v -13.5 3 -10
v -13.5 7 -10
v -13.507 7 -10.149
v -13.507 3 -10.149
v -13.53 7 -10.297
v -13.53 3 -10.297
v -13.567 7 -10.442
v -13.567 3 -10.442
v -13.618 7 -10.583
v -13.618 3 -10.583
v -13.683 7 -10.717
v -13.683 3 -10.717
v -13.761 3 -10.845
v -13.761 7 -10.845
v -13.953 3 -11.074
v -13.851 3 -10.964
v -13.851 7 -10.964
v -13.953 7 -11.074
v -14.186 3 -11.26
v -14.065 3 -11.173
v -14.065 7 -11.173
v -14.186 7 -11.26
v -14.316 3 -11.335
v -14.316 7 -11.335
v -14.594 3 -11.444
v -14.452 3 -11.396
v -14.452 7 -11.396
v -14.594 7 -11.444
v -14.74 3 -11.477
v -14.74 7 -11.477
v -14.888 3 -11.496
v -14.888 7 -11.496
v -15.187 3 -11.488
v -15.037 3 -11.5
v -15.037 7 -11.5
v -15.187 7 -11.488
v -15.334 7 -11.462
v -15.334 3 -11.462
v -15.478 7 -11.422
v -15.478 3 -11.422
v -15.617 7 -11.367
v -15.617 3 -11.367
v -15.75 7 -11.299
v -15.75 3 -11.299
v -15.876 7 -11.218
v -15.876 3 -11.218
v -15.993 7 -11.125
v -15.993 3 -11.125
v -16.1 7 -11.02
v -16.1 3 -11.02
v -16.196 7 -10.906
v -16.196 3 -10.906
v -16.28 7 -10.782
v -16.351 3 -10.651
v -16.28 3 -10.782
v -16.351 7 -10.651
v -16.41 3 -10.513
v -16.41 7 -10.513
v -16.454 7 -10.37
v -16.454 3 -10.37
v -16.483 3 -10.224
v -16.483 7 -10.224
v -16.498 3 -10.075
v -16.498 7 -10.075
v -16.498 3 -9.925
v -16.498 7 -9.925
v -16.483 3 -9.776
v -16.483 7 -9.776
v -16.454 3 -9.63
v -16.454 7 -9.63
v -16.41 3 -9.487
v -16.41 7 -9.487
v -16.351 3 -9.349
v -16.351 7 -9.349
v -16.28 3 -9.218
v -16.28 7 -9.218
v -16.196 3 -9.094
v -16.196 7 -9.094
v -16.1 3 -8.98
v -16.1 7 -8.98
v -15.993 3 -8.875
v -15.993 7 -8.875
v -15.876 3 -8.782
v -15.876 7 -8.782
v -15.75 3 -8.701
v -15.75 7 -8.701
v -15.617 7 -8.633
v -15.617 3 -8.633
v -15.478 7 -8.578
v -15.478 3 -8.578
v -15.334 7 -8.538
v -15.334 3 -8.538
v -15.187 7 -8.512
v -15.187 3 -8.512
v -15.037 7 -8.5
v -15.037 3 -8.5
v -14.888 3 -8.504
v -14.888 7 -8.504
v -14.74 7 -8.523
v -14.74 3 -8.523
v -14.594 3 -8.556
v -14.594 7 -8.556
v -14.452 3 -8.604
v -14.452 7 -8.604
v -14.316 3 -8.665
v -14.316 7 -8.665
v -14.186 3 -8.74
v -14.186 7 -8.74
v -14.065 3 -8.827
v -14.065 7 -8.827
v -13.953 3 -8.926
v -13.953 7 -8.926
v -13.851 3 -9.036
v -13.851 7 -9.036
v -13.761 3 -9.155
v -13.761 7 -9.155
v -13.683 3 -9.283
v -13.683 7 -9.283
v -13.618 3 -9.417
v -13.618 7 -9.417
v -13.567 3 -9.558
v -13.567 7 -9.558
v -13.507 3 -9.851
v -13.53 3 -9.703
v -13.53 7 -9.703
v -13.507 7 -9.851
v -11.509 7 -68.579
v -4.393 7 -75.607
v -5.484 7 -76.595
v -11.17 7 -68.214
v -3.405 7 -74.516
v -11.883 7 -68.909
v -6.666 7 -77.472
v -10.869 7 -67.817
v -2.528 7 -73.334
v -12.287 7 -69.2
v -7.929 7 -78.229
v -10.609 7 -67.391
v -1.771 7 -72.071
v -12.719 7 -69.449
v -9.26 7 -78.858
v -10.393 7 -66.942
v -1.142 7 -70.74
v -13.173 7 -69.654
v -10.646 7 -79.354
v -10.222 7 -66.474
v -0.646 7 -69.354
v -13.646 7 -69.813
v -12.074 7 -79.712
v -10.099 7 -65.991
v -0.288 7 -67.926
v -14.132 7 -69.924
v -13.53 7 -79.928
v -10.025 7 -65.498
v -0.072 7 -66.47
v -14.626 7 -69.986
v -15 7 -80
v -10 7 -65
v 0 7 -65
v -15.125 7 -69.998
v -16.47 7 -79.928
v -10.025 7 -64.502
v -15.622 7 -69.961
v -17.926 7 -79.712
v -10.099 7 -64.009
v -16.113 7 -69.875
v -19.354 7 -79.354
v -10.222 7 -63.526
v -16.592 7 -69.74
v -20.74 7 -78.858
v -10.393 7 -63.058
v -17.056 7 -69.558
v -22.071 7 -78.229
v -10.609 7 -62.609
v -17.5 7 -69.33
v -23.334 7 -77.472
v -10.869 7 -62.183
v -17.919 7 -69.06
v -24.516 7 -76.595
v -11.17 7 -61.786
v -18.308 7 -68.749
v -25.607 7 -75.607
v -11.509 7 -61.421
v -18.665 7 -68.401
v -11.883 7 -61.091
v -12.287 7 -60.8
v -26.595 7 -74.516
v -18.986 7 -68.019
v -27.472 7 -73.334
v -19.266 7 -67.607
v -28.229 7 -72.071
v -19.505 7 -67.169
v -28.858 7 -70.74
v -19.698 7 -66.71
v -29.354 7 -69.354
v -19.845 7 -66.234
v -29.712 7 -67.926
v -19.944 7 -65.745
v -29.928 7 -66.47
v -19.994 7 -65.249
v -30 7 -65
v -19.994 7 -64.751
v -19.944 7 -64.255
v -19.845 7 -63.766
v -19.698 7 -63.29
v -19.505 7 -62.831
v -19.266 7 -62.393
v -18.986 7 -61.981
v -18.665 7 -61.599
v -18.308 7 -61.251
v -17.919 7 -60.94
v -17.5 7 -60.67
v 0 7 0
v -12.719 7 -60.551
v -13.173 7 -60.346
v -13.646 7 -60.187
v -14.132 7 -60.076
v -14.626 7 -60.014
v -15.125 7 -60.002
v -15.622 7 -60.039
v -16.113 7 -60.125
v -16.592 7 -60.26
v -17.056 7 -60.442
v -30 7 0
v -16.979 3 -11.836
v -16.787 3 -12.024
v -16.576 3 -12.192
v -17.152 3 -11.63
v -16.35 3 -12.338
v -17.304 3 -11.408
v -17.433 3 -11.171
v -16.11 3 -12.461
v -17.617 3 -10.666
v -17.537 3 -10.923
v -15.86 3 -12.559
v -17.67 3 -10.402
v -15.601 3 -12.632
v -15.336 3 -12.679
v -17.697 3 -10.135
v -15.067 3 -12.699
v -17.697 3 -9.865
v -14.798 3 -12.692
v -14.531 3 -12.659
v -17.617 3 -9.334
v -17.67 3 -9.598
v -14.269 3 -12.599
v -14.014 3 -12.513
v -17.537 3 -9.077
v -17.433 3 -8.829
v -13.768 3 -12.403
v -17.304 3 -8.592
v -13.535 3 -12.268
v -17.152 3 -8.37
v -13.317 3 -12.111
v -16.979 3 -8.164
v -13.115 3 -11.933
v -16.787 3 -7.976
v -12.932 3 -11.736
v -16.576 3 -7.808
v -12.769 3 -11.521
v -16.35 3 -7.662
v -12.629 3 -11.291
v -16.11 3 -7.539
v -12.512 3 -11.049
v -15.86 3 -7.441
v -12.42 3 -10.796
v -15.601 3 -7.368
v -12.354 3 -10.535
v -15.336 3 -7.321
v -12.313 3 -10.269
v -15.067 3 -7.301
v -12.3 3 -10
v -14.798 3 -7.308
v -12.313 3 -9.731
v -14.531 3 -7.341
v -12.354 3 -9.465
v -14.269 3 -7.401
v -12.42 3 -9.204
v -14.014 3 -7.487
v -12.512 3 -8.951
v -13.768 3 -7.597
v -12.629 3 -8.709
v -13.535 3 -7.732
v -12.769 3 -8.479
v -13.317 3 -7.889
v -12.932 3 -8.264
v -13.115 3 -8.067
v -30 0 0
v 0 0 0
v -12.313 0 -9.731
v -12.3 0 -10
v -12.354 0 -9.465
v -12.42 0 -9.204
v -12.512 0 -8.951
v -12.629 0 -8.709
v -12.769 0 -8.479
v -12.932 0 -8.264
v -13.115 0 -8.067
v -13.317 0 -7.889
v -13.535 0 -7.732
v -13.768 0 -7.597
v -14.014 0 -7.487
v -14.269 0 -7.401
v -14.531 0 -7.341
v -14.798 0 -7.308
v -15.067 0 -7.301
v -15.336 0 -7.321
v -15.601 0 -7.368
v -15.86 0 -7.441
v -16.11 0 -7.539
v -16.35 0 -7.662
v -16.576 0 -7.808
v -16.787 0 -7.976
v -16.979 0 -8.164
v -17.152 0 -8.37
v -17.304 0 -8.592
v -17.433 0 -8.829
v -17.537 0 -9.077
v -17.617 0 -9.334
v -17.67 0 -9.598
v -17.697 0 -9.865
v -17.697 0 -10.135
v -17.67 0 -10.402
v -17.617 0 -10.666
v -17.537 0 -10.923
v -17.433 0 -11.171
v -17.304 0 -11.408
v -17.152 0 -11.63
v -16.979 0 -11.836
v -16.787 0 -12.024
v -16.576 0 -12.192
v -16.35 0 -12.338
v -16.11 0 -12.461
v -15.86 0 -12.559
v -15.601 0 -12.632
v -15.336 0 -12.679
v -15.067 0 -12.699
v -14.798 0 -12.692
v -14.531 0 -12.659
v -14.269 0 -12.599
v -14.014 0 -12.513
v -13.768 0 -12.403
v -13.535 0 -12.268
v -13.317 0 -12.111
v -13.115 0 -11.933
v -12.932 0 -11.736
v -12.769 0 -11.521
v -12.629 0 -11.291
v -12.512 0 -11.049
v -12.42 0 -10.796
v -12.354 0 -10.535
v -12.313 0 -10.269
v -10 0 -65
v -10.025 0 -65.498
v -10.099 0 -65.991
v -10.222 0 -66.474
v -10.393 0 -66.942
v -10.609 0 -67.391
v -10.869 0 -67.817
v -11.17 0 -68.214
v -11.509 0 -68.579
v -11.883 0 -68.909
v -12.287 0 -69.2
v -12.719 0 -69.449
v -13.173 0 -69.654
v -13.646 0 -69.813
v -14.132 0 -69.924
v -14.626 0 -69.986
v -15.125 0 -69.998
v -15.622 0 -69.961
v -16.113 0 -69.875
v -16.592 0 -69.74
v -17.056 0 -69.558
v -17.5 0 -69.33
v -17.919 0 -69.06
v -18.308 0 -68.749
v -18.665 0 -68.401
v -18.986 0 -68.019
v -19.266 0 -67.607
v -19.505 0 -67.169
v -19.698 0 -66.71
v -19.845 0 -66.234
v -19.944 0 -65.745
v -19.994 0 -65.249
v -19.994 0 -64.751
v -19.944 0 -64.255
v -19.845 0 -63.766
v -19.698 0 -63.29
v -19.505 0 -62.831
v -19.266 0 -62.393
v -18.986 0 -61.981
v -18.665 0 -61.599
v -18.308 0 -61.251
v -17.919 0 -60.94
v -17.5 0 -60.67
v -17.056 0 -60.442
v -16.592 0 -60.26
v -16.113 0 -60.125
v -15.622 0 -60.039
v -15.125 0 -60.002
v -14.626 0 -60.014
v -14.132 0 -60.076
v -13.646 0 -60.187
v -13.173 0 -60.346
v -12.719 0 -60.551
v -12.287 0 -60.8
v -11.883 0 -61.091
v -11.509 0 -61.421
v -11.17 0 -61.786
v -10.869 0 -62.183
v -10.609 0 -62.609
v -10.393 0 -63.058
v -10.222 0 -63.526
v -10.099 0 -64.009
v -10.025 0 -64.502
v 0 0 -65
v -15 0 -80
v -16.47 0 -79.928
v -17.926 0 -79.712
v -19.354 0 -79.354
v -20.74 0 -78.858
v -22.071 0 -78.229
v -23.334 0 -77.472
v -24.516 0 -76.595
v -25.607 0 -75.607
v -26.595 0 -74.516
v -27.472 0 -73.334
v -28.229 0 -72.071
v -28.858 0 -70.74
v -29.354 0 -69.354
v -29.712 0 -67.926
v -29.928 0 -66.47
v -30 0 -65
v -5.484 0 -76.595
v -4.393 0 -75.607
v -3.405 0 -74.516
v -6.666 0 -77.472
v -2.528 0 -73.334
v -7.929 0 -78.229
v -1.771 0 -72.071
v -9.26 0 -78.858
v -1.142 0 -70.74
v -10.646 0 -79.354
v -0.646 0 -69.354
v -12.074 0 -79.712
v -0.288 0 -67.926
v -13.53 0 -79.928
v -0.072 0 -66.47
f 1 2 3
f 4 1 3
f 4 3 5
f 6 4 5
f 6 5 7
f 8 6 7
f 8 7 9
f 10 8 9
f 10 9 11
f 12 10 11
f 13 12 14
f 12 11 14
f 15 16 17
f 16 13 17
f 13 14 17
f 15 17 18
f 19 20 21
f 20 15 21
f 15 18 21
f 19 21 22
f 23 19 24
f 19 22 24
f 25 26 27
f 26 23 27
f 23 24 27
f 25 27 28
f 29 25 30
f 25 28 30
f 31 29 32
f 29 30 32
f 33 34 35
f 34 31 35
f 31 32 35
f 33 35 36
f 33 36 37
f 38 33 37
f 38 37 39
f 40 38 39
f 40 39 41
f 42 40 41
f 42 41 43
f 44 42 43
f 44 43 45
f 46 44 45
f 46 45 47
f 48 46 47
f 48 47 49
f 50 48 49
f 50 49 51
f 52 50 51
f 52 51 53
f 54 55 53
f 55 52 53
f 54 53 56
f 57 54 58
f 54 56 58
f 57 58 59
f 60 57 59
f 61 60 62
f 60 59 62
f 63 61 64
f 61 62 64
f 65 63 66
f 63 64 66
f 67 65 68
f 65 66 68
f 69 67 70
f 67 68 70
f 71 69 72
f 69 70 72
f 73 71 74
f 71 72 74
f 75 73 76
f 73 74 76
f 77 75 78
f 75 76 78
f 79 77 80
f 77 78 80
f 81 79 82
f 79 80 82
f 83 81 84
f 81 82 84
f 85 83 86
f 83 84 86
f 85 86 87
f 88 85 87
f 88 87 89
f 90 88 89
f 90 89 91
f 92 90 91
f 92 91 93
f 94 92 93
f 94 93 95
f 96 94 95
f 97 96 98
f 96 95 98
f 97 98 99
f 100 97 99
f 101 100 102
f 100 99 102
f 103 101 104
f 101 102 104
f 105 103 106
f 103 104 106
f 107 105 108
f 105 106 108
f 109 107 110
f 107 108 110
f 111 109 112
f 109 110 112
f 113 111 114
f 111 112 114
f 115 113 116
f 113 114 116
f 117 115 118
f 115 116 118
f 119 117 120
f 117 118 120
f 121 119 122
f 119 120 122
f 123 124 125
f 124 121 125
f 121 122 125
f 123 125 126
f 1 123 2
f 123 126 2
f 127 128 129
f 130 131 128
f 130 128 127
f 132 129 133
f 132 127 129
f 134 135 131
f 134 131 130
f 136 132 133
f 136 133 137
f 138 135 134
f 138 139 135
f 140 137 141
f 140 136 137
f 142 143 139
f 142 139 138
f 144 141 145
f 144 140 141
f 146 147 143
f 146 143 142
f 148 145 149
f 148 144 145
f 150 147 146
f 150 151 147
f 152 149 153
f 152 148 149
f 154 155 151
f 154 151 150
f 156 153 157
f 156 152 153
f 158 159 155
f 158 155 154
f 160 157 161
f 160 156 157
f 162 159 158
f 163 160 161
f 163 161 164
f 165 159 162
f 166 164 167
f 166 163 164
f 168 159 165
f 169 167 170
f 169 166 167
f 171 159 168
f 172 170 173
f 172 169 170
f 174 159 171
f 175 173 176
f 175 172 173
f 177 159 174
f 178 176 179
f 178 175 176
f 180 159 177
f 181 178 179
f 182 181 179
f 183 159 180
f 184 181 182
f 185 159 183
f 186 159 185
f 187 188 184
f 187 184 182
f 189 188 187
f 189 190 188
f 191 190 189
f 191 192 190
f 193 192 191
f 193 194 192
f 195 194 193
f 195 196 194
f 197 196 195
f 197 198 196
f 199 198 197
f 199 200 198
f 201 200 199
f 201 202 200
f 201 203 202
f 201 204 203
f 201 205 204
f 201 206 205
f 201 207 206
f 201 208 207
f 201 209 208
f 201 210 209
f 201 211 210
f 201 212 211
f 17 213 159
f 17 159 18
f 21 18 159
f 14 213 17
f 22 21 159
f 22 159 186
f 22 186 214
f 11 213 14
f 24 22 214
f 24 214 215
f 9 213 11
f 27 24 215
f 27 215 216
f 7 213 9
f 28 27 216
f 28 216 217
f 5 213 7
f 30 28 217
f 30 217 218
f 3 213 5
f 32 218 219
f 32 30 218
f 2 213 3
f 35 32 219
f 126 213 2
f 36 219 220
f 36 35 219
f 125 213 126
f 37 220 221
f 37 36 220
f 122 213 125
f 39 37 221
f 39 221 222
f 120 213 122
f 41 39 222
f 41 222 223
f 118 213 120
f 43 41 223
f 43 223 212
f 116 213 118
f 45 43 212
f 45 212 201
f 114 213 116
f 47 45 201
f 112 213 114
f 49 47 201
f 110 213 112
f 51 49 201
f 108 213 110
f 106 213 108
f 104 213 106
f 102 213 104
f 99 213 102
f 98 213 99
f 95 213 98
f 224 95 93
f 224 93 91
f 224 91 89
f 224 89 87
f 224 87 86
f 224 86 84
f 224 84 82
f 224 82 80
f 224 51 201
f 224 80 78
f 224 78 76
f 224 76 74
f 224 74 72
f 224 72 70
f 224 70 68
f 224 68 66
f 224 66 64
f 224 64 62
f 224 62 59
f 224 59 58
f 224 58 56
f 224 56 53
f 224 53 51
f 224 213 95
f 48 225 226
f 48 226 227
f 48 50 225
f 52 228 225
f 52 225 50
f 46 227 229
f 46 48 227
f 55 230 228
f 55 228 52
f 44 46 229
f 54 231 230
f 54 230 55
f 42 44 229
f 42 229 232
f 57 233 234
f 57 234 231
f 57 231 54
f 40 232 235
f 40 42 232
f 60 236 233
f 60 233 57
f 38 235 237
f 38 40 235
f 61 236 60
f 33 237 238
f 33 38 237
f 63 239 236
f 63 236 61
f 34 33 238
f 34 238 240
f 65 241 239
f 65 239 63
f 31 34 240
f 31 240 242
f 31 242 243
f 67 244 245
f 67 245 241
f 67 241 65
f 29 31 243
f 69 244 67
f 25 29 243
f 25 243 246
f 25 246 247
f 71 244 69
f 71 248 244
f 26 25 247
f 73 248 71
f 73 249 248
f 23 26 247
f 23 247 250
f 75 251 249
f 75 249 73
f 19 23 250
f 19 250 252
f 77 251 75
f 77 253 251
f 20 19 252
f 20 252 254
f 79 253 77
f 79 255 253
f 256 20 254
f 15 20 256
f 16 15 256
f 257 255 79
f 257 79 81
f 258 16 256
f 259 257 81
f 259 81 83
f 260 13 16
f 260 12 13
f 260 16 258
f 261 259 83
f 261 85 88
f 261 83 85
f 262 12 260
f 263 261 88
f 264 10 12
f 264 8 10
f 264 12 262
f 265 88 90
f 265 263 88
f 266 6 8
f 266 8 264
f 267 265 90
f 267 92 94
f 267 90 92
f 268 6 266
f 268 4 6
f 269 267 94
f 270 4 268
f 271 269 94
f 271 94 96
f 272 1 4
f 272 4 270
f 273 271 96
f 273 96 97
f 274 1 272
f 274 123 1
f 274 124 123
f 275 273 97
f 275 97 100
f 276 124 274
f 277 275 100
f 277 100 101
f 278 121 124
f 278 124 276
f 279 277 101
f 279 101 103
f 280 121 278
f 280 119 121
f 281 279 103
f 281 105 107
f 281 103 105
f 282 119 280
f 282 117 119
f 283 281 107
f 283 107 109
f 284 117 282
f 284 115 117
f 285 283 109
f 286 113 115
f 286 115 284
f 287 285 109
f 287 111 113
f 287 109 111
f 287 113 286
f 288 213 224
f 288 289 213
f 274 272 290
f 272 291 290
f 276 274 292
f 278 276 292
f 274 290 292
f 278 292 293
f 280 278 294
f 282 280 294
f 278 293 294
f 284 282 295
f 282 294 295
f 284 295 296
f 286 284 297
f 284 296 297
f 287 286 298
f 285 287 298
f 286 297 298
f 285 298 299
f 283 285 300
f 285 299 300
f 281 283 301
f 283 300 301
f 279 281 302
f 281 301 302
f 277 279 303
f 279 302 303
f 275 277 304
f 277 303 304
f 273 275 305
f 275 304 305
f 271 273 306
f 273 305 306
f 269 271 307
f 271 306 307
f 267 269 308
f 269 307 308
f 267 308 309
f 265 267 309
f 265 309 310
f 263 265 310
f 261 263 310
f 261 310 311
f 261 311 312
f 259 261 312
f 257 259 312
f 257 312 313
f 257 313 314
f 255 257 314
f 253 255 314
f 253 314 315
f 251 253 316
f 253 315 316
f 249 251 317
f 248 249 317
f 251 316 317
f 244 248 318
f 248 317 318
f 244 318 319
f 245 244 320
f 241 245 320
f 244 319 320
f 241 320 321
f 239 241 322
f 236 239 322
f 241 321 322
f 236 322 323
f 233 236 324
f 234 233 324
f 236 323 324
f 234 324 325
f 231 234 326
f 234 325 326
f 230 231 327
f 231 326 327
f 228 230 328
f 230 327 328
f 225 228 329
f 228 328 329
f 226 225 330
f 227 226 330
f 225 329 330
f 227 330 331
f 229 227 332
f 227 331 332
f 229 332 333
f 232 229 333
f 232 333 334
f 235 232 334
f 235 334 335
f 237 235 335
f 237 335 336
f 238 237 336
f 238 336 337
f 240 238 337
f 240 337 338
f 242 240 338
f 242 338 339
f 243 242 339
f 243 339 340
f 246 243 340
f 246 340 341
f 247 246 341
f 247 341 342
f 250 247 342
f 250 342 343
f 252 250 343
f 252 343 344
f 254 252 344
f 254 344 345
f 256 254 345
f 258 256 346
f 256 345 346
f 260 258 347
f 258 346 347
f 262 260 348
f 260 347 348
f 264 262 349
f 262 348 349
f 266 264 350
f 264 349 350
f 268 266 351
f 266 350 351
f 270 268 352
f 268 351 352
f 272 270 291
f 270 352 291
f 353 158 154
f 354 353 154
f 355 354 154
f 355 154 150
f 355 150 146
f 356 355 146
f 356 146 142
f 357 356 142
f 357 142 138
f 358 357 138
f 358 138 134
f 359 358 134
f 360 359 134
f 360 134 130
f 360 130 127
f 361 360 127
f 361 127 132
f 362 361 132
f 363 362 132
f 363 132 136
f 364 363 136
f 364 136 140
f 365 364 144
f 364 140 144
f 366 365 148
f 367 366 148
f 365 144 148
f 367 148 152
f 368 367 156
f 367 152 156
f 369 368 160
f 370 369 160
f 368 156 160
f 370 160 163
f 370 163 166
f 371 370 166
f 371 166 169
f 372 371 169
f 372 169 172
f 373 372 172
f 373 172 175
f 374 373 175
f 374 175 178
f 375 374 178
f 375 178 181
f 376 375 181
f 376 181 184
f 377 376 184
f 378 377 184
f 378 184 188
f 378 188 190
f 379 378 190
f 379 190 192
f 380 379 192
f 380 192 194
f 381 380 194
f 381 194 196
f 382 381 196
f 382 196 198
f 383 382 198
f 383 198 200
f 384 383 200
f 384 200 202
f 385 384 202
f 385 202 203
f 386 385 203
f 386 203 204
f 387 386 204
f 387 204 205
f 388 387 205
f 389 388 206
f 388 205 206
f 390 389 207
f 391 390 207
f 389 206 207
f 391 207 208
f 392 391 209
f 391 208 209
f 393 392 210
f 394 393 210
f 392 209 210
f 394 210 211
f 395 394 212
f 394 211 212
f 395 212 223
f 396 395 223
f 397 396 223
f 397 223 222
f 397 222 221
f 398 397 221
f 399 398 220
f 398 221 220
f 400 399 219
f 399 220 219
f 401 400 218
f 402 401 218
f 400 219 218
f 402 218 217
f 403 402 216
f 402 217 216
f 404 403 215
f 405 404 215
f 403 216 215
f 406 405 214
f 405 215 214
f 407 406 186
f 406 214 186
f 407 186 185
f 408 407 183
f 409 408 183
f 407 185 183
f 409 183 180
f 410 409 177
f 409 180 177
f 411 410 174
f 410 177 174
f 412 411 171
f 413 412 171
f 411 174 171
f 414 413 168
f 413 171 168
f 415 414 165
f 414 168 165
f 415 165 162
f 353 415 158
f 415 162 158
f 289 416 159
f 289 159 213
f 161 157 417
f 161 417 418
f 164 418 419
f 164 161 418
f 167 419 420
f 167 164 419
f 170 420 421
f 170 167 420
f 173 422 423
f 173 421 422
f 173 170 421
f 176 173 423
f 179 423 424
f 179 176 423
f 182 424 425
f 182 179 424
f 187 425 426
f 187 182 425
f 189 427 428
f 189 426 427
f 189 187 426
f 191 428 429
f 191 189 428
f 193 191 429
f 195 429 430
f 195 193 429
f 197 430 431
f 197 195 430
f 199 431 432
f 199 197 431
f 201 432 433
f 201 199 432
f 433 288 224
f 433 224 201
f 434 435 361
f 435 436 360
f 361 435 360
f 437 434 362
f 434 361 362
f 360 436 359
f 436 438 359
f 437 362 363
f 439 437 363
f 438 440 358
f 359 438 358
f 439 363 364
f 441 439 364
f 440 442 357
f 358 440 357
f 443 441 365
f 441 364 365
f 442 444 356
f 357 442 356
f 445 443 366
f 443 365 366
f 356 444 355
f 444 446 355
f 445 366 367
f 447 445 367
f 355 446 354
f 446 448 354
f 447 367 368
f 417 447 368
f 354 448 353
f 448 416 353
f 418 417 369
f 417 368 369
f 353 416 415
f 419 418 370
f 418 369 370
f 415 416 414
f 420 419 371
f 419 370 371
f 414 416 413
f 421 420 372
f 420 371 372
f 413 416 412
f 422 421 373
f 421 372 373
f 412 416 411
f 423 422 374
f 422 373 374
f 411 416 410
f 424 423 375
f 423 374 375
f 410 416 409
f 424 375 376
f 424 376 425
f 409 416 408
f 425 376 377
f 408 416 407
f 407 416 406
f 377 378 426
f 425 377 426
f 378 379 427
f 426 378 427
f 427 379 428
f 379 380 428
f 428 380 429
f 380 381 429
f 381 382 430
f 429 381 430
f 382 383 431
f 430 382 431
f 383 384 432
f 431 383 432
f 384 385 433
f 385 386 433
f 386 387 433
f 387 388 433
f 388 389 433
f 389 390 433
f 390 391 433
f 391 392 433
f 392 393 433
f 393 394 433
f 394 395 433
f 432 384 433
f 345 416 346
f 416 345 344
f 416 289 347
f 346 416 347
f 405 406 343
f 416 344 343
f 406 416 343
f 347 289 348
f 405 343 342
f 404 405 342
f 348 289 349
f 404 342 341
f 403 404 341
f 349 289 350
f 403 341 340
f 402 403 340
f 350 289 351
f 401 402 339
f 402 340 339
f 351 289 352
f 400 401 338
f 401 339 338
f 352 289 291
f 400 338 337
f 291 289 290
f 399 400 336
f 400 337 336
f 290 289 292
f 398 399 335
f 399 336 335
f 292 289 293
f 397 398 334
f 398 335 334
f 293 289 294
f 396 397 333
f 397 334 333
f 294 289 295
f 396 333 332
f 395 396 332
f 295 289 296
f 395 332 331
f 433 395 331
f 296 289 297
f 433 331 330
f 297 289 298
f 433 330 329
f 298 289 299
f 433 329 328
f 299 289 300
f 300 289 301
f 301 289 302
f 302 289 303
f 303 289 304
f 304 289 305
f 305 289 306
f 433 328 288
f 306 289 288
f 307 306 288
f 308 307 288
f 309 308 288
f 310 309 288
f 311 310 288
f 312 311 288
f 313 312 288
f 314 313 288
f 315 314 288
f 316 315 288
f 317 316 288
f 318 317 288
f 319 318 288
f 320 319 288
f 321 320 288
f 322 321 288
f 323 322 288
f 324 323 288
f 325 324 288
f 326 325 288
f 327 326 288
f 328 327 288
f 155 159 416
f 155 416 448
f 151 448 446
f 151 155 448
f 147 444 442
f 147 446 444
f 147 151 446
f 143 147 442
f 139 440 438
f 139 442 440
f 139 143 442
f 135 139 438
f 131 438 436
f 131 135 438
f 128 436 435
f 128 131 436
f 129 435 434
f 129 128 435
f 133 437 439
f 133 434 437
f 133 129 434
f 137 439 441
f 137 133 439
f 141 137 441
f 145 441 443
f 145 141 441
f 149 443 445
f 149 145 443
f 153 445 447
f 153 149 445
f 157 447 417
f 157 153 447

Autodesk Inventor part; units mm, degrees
ref_plane "YZ Plane" through (0, 0, 0) normal (1, 0, 0) x (0, 1, 0)
ref_plane "XZ Plane" through (0, 0, 0) normal (0, 1, 0) x (-1, 0, 0)
ref_plane "XY Plane" through (0, 0, 0) normal (0, 0, 1) x (1, 0, 0)
sketch "Sketch1" plane through (0, 0, 0) normal (0, 1, 0) x (-1, 0, 0)
  line L0 (0, 0) -> (30, 0)
  line L1 (30, 0) -> (30, -80)
  line L2 (30, -80) -> (0, -80)
  line L3 (0, -80) -> (0, 0)
  dimension "d0" = 30
  dimension "d1" = 80
extrude "Extrusion1" add sketch "Sketch1" along normal blind 7
fillet "Fillet1" radius 15 2 edges at (0, 3.5, -80) (-30, 3.5, -80)
sketch "Sketch2" plane through (0, 7, 0) normal (0, 1, 0) x (1, 0, 0)
  arc A0 (0, 65) -> (-30, 65) centre (-15, 65) ccw projected
  circle A1 centre (-15, 65) radius 5
  point P0 (0, 0)
  dimension "d5" = 10
extrude "Extrusion2" cut sketch "Sketch2" against normal blind 7
sketch "Sketch3" plane through (0, 0, 0) normal (0, -1, 0) x (1, 0, 0)
  line L0 (-30, 0) -> (0, 0) projected
  circle A0 centre (-15, -10) radius 2.7
  dimension "d9" = 5.4
extrude "Extrusion3" cut sketch "Sketch3" against normal blind 3
sketch "Sketch4" plane through (0, 7, 0) normal (0, 1, 0) x (1, 0, 0)
  line L0 (-30, 0) -> (0, 0) projected
  line L1 (-15, 0) -> (-15, 10)
  circle A0 centre (-15, 10) radius 1.5
  dimension "d12" = 10
  dimension "d13" = 3
extrude "Extrusion4" cut sketch "Sketch4" against normal blind 7
properties part number "Crank"
